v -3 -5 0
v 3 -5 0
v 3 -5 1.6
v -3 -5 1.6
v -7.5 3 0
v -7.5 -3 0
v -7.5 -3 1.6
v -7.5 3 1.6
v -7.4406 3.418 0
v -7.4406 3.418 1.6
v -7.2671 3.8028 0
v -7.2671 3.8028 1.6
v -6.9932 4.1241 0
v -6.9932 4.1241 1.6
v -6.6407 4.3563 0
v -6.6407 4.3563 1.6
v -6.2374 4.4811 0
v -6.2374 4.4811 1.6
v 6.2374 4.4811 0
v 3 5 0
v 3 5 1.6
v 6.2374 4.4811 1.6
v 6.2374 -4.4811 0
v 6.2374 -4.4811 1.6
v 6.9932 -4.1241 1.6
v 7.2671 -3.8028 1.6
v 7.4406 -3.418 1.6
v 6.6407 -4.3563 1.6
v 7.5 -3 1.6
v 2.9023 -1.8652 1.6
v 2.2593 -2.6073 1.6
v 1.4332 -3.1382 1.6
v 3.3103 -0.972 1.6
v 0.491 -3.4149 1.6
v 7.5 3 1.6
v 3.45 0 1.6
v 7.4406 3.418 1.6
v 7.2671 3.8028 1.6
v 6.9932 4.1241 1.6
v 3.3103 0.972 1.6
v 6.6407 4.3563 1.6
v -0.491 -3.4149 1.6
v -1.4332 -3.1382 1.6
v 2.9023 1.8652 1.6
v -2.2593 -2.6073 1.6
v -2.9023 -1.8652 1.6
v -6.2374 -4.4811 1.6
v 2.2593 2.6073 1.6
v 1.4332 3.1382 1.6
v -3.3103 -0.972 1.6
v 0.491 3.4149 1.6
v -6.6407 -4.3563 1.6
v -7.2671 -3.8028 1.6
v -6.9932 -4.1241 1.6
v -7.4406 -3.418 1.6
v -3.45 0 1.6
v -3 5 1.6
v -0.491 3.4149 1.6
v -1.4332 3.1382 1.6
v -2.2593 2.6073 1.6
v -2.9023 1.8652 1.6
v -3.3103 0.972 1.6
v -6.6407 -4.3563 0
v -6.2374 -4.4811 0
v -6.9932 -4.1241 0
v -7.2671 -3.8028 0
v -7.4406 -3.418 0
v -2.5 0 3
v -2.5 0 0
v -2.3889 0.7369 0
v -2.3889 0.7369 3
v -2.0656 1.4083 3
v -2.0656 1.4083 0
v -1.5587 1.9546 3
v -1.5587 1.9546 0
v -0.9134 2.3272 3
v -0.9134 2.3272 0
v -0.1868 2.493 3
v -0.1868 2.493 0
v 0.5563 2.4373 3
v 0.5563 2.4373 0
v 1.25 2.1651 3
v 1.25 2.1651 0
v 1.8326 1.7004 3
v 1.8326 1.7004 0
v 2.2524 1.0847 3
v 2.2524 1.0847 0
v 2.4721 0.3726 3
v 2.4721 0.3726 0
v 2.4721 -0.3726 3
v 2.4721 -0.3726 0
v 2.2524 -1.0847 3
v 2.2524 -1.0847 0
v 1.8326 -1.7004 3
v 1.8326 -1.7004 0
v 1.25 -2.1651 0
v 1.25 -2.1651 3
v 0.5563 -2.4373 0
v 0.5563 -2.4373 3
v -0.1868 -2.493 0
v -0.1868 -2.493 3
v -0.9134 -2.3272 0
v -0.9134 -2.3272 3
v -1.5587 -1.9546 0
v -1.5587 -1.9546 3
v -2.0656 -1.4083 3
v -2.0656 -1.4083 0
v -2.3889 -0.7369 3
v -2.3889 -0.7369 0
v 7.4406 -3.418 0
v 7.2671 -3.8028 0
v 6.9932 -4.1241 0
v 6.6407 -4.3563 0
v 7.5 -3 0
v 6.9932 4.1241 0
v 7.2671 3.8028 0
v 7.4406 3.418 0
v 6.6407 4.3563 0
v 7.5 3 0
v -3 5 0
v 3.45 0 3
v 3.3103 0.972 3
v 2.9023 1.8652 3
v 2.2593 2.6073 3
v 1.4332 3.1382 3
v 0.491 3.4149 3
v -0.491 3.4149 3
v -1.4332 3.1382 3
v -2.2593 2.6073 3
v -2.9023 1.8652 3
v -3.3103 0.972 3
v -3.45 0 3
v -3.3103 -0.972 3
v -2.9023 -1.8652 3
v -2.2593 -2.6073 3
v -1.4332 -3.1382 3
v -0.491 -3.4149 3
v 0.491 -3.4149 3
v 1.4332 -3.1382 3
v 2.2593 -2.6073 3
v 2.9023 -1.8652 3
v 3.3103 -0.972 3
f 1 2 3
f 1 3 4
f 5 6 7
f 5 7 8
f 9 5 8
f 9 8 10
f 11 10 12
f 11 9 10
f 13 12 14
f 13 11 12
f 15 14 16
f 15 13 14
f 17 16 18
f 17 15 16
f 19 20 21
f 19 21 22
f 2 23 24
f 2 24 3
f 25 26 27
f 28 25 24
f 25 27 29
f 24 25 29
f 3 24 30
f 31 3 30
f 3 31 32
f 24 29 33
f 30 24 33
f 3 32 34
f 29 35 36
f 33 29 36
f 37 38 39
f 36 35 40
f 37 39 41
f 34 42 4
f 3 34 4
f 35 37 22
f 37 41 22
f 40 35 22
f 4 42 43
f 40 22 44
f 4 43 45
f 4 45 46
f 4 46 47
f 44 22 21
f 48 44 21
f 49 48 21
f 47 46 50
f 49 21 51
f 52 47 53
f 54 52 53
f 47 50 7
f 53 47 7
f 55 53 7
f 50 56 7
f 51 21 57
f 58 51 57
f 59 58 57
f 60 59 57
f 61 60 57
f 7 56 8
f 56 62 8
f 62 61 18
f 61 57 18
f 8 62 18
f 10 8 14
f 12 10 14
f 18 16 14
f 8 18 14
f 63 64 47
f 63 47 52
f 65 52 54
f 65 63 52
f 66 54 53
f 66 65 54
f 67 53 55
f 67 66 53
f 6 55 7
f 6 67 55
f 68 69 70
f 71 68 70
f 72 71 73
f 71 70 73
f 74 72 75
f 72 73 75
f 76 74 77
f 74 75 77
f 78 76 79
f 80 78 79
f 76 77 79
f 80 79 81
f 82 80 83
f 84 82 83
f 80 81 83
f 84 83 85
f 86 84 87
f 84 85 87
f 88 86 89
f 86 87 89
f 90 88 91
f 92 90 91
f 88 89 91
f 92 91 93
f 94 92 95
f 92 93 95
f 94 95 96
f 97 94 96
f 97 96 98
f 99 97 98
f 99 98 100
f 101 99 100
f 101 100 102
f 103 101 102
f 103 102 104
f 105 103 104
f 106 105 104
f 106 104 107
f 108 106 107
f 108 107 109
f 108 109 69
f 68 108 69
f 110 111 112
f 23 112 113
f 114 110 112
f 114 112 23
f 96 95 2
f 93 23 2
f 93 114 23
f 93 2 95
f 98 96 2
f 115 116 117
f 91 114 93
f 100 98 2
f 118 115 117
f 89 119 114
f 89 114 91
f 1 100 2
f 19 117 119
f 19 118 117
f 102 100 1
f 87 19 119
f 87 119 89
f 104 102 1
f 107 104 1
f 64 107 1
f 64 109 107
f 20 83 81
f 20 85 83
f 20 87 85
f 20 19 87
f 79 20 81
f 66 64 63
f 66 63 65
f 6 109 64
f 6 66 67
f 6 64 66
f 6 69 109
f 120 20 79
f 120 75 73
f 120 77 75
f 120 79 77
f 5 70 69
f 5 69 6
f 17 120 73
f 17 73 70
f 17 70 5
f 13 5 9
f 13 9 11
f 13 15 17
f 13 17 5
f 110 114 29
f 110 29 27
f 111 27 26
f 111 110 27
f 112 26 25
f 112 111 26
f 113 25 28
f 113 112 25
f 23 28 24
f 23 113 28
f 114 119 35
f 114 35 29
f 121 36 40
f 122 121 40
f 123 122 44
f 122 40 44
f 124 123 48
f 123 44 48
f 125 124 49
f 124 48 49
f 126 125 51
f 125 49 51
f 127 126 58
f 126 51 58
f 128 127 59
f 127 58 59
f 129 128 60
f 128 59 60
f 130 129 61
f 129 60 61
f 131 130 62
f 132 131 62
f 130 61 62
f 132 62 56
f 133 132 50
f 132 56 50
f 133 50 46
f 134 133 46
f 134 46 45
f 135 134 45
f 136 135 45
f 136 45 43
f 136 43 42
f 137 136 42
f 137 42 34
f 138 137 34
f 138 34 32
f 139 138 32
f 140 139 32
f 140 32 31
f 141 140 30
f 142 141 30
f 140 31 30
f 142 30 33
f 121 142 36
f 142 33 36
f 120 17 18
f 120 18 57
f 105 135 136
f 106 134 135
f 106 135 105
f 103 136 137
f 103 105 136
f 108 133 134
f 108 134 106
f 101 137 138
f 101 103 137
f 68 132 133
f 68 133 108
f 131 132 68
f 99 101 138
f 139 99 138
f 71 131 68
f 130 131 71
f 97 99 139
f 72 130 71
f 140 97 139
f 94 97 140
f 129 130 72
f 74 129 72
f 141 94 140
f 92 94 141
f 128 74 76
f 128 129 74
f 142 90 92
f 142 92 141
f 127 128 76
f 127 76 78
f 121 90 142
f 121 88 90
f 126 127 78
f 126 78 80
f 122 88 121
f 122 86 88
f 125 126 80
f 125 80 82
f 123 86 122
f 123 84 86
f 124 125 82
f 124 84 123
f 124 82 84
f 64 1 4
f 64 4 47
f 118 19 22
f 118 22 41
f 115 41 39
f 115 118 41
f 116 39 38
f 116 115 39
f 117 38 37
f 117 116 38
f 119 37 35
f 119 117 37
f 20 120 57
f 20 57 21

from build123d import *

# Parameters (mm, degrees)
BOSS_EXTRUDE1_DEPTH   = 1.6
SKETCH2_R             = 3.45
BOSS_EXTRUDE2_DEPTH   = 1.4
M6X1_0_TAPPED_HOLE1_D = 5


with BuildPart() as part:
    # Sketch1 → Boss-Extrude1 (new body)
    with BuildSketch(Plane.XY):
        with BuildLine():
            Line((-6.237396753, 4.481095129), (-3, 5))
            Line((-3, 5), (3, 5))
            Line((3, 5), (6.237396753, 4.481095129))
            ThreePointArc((6.237396753, 4.481095129), (7.141511088, 3.973114811), (7.5, 3))
            Line((7.5, 3), (7.5, -3))
            ThreePointArc((7.5, -3), (7.141511088, -3.973114811), (6.237396753, -4.481095129))
            Line((6.237396753, -4.481095129), (3, -5))
            Line((3, -5), (-3, -5))
            Line((-3, -5), (-6.237396753, -4.481095129))
            ThreePointArc((-6.237396753, -4.481095129), (-7.141511088, -3.973114811), (-7.5, -3))
            Line((-7.5, -3), (-7.5, 3))
            ThreePointArc((-7.5, 3), (-7.141511088, 3.973114811), (-6.237396753, 4.481095129))
        make_face()
    extrude(amount=BOSS_EXTRUDE1_DEPTH)

    # Sketch2 → Boss-Extrude2 (add)
    with BuildSketch(Plane.XY.offset(1.6)):
        Circle(SKETCH2_R)
    extrude(amount=BOSS_EXTRUDE2_DEPTH)

    # M6x1.0 Tapped Hole1 (through all)
    with Locations(Plane.XY.offset(3)):
        with Locations((0, 0)):
            Hole(M6X1_0_TAPPED_HOLE1_D / 2)


solid = part.part
